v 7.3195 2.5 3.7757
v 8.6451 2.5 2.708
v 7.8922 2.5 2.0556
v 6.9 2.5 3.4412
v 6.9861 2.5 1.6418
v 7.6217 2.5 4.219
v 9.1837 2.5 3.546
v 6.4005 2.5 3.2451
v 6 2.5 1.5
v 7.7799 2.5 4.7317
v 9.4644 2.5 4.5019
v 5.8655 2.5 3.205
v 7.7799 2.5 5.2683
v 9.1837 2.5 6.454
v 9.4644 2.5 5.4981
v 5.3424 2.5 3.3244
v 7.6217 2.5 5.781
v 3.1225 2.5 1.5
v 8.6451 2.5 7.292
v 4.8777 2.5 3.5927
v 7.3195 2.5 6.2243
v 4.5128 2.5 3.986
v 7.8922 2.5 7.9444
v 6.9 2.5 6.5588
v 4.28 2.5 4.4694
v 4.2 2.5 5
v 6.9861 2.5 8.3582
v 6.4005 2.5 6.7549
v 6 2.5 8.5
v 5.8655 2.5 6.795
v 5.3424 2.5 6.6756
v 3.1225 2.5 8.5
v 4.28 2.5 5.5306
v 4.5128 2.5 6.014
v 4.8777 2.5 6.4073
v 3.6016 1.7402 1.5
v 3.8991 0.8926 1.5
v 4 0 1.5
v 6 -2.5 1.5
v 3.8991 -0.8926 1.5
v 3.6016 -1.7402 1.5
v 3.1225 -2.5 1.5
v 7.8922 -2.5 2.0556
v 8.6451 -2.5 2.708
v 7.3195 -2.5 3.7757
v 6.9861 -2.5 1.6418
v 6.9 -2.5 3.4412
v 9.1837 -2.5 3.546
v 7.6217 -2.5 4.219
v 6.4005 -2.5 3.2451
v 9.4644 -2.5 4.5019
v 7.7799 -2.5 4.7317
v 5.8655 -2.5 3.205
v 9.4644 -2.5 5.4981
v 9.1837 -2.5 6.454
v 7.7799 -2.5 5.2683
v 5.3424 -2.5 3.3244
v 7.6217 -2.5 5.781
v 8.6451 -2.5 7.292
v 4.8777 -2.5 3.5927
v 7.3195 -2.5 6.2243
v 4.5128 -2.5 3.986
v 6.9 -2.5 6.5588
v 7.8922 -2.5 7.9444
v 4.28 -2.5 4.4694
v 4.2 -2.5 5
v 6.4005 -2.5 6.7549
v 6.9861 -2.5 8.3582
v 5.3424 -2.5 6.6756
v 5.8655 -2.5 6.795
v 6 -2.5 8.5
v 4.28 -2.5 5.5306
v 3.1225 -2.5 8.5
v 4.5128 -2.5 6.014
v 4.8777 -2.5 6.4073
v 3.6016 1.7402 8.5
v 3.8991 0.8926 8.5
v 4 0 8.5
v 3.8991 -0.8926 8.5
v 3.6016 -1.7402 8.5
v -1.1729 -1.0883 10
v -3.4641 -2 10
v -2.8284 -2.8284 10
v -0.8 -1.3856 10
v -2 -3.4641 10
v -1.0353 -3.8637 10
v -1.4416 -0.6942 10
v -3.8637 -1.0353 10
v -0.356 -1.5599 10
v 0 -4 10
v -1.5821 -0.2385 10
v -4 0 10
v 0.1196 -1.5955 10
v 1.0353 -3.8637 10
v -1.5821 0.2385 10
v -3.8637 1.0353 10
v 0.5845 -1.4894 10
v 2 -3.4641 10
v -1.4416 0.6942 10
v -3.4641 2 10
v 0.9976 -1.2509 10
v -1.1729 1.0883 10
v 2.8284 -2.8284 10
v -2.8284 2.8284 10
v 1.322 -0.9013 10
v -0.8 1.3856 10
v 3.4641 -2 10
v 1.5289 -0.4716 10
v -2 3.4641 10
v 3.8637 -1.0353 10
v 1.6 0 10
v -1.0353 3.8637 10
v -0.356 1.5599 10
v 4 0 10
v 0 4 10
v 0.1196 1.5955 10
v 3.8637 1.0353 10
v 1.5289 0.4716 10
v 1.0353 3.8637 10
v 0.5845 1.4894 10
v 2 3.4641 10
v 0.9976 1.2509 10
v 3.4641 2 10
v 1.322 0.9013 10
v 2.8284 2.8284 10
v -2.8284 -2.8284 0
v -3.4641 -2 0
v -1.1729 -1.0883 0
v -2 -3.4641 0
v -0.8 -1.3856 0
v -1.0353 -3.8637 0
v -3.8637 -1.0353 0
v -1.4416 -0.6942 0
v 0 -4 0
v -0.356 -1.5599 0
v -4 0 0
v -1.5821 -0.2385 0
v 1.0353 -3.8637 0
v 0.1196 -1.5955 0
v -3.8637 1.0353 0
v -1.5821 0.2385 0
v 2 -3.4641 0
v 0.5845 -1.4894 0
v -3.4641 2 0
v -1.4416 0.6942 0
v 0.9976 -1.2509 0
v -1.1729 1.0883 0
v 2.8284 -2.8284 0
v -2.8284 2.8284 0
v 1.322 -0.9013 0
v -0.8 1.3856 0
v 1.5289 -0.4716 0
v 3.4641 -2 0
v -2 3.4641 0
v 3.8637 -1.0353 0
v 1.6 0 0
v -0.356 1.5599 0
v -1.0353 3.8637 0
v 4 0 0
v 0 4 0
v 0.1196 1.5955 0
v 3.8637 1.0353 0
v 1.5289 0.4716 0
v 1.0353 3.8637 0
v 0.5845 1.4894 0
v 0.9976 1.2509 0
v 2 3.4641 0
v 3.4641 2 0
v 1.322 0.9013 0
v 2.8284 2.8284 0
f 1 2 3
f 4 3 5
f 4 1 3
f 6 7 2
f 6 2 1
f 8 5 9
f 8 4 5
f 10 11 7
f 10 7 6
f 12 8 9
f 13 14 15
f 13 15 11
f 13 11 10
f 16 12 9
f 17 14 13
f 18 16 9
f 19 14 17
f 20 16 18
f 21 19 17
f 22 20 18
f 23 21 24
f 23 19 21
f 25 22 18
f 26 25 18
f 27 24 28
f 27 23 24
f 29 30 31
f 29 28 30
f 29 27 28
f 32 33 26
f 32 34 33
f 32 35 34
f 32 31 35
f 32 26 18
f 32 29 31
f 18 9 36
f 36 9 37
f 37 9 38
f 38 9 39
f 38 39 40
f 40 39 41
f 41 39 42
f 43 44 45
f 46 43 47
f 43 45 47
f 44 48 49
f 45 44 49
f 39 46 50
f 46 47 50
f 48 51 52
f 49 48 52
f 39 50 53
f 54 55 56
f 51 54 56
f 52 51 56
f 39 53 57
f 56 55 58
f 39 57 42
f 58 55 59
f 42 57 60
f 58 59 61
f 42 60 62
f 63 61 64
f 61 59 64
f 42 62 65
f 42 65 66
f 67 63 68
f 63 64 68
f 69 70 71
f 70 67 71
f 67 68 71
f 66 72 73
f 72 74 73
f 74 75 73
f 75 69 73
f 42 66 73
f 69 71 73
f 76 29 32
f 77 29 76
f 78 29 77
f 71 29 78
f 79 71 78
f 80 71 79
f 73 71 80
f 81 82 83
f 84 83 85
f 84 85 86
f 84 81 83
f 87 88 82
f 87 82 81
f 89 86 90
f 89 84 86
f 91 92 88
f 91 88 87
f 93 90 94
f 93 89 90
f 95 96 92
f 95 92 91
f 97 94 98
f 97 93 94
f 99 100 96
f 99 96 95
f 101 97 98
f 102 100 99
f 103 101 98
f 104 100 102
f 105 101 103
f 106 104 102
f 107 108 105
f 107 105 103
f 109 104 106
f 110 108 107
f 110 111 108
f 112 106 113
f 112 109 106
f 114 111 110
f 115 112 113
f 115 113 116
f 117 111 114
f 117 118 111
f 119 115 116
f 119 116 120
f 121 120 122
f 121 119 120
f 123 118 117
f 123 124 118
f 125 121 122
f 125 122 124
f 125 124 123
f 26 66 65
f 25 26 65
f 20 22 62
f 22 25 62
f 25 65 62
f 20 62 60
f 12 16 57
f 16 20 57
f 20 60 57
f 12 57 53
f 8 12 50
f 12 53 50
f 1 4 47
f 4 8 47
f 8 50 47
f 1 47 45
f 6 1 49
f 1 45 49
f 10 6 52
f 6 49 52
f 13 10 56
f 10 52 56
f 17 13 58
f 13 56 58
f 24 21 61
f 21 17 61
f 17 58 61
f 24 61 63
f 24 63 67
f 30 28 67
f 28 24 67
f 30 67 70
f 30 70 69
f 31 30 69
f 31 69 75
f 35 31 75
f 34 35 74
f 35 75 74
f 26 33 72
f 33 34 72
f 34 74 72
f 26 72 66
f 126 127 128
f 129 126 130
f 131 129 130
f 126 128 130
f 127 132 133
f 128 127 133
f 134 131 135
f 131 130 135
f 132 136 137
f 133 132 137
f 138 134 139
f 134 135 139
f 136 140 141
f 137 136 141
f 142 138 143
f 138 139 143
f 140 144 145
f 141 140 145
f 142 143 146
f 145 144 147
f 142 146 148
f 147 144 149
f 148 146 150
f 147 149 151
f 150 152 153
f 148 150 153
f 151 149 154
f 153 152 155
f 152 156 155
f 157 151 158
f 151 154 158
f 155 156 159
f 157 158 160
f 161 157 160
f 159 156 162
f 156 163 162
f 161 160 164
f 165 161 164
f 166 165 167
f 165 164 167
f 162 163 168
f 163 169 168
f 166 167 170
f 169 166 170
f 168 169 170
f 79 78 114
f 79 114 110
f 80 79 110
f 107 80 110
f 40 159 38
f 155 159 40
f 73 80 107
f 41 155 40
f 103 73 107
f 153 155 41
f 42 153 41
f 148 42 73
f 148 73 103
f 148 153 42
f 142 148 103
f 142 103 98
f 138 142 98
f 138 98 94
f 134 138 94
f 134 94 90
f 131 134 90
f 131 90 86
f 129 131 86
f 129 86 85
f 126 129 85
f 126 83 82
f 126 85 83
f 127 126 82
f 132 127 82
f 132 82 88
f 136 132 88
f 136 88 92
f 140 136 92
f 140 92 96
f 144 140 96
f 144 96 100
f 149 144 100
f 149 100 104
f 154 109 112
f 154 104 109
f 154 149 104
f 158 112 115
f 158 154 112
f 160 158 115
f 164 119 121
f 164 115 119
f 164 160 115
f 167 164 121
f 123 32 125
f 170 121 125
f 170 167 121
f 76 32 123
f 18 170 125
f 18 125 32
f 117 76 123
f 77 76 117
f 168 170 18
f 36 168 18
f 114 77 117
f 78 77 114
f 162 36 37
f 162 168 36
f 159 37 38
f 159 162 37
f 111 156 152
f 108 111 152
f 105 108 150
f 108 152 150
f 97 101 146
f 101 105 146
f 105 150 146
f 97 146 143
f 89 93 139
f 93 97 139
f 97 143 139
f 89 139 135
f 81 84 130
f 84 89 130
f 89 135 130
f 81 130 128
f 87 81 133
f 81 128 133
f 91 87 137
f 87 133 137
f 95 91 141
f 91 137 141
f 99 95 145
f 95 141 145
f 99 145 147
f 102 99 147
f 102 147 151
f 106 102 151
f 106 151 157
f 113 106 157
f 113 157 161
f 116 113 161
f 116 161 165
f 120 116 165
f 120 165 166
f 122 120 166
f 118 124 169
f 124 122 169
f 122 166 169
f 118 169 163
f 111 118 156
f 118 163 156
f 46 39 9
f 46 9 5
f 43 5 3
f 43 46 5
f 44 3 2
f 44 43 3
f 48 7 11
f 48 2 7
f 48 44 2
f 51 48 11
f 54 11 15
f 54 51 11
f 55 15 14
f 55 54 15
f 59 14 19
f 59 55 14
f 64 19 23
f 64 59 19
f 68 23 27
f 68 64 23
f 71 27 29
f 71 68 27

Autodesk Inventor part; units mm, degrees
ref_plane "YZ Plane" through (0, 0, 0) normal (1, 0, 0) x (0, 1, 0)
ref_plane "XZ Plane" through (0, 0, 0) normal (0, 1, 0) x (-1, 0, 0)
ref_plane "XY Plane" through (0, 0, 0) normal (0, 0, 1) x (1, 0, 0)
sketch "草圖2" plane through (0, 0, 0) normal (0, 0, 1) x (1, 0, 0)
  circle A0 centre (0, 0) radius 1.6
  circle A1 centre (0, 0) radius 4
  dimension "d6" = 3.2
  dimension "d7" = 8
extrude "擠出2" add sketch "草圖2" along normal blind 10
sketch "草圖3" plane through (0, 0, 0) normal (0, 1, 0) x (-1, 0, 0)
  line L0 (0, 2.5) -> (0, 7.5)
  circle A0 centre (-6, 5) radius 1.8
  line L1 (-3, 2.5) -> (-3, 7.5)
  circle A1 centre (-6, 5) radius 3.5
  line L2 (-6, 1.5) -> (0, 1.5)
  line L3 (-6, 8.5) -> (0, 8.5)
  line L4 (0, 8.5) -> (0, 1.5)
  point P0 (0, 0)
  point P1 (-3.8558, -8.4985)
  dimension "d10" = 5
  dimension "d13" = 3.6
  dimension "d16" = 7
extrude "Extrusion4" add sketch "草圖3" along normal mid plane 5
sketch "Sketch5" plane through (0, 0, 8.5) normal (0, 0, 1) x (1, 0, 0)
  circle A0 centre (0, 0) radius 1.6
  dimension "d19" = 3.2
extrude "Extrusion5" cut sketch "Sketch5" along normal through all both and the other way through all
properties part number "避震器上部"
